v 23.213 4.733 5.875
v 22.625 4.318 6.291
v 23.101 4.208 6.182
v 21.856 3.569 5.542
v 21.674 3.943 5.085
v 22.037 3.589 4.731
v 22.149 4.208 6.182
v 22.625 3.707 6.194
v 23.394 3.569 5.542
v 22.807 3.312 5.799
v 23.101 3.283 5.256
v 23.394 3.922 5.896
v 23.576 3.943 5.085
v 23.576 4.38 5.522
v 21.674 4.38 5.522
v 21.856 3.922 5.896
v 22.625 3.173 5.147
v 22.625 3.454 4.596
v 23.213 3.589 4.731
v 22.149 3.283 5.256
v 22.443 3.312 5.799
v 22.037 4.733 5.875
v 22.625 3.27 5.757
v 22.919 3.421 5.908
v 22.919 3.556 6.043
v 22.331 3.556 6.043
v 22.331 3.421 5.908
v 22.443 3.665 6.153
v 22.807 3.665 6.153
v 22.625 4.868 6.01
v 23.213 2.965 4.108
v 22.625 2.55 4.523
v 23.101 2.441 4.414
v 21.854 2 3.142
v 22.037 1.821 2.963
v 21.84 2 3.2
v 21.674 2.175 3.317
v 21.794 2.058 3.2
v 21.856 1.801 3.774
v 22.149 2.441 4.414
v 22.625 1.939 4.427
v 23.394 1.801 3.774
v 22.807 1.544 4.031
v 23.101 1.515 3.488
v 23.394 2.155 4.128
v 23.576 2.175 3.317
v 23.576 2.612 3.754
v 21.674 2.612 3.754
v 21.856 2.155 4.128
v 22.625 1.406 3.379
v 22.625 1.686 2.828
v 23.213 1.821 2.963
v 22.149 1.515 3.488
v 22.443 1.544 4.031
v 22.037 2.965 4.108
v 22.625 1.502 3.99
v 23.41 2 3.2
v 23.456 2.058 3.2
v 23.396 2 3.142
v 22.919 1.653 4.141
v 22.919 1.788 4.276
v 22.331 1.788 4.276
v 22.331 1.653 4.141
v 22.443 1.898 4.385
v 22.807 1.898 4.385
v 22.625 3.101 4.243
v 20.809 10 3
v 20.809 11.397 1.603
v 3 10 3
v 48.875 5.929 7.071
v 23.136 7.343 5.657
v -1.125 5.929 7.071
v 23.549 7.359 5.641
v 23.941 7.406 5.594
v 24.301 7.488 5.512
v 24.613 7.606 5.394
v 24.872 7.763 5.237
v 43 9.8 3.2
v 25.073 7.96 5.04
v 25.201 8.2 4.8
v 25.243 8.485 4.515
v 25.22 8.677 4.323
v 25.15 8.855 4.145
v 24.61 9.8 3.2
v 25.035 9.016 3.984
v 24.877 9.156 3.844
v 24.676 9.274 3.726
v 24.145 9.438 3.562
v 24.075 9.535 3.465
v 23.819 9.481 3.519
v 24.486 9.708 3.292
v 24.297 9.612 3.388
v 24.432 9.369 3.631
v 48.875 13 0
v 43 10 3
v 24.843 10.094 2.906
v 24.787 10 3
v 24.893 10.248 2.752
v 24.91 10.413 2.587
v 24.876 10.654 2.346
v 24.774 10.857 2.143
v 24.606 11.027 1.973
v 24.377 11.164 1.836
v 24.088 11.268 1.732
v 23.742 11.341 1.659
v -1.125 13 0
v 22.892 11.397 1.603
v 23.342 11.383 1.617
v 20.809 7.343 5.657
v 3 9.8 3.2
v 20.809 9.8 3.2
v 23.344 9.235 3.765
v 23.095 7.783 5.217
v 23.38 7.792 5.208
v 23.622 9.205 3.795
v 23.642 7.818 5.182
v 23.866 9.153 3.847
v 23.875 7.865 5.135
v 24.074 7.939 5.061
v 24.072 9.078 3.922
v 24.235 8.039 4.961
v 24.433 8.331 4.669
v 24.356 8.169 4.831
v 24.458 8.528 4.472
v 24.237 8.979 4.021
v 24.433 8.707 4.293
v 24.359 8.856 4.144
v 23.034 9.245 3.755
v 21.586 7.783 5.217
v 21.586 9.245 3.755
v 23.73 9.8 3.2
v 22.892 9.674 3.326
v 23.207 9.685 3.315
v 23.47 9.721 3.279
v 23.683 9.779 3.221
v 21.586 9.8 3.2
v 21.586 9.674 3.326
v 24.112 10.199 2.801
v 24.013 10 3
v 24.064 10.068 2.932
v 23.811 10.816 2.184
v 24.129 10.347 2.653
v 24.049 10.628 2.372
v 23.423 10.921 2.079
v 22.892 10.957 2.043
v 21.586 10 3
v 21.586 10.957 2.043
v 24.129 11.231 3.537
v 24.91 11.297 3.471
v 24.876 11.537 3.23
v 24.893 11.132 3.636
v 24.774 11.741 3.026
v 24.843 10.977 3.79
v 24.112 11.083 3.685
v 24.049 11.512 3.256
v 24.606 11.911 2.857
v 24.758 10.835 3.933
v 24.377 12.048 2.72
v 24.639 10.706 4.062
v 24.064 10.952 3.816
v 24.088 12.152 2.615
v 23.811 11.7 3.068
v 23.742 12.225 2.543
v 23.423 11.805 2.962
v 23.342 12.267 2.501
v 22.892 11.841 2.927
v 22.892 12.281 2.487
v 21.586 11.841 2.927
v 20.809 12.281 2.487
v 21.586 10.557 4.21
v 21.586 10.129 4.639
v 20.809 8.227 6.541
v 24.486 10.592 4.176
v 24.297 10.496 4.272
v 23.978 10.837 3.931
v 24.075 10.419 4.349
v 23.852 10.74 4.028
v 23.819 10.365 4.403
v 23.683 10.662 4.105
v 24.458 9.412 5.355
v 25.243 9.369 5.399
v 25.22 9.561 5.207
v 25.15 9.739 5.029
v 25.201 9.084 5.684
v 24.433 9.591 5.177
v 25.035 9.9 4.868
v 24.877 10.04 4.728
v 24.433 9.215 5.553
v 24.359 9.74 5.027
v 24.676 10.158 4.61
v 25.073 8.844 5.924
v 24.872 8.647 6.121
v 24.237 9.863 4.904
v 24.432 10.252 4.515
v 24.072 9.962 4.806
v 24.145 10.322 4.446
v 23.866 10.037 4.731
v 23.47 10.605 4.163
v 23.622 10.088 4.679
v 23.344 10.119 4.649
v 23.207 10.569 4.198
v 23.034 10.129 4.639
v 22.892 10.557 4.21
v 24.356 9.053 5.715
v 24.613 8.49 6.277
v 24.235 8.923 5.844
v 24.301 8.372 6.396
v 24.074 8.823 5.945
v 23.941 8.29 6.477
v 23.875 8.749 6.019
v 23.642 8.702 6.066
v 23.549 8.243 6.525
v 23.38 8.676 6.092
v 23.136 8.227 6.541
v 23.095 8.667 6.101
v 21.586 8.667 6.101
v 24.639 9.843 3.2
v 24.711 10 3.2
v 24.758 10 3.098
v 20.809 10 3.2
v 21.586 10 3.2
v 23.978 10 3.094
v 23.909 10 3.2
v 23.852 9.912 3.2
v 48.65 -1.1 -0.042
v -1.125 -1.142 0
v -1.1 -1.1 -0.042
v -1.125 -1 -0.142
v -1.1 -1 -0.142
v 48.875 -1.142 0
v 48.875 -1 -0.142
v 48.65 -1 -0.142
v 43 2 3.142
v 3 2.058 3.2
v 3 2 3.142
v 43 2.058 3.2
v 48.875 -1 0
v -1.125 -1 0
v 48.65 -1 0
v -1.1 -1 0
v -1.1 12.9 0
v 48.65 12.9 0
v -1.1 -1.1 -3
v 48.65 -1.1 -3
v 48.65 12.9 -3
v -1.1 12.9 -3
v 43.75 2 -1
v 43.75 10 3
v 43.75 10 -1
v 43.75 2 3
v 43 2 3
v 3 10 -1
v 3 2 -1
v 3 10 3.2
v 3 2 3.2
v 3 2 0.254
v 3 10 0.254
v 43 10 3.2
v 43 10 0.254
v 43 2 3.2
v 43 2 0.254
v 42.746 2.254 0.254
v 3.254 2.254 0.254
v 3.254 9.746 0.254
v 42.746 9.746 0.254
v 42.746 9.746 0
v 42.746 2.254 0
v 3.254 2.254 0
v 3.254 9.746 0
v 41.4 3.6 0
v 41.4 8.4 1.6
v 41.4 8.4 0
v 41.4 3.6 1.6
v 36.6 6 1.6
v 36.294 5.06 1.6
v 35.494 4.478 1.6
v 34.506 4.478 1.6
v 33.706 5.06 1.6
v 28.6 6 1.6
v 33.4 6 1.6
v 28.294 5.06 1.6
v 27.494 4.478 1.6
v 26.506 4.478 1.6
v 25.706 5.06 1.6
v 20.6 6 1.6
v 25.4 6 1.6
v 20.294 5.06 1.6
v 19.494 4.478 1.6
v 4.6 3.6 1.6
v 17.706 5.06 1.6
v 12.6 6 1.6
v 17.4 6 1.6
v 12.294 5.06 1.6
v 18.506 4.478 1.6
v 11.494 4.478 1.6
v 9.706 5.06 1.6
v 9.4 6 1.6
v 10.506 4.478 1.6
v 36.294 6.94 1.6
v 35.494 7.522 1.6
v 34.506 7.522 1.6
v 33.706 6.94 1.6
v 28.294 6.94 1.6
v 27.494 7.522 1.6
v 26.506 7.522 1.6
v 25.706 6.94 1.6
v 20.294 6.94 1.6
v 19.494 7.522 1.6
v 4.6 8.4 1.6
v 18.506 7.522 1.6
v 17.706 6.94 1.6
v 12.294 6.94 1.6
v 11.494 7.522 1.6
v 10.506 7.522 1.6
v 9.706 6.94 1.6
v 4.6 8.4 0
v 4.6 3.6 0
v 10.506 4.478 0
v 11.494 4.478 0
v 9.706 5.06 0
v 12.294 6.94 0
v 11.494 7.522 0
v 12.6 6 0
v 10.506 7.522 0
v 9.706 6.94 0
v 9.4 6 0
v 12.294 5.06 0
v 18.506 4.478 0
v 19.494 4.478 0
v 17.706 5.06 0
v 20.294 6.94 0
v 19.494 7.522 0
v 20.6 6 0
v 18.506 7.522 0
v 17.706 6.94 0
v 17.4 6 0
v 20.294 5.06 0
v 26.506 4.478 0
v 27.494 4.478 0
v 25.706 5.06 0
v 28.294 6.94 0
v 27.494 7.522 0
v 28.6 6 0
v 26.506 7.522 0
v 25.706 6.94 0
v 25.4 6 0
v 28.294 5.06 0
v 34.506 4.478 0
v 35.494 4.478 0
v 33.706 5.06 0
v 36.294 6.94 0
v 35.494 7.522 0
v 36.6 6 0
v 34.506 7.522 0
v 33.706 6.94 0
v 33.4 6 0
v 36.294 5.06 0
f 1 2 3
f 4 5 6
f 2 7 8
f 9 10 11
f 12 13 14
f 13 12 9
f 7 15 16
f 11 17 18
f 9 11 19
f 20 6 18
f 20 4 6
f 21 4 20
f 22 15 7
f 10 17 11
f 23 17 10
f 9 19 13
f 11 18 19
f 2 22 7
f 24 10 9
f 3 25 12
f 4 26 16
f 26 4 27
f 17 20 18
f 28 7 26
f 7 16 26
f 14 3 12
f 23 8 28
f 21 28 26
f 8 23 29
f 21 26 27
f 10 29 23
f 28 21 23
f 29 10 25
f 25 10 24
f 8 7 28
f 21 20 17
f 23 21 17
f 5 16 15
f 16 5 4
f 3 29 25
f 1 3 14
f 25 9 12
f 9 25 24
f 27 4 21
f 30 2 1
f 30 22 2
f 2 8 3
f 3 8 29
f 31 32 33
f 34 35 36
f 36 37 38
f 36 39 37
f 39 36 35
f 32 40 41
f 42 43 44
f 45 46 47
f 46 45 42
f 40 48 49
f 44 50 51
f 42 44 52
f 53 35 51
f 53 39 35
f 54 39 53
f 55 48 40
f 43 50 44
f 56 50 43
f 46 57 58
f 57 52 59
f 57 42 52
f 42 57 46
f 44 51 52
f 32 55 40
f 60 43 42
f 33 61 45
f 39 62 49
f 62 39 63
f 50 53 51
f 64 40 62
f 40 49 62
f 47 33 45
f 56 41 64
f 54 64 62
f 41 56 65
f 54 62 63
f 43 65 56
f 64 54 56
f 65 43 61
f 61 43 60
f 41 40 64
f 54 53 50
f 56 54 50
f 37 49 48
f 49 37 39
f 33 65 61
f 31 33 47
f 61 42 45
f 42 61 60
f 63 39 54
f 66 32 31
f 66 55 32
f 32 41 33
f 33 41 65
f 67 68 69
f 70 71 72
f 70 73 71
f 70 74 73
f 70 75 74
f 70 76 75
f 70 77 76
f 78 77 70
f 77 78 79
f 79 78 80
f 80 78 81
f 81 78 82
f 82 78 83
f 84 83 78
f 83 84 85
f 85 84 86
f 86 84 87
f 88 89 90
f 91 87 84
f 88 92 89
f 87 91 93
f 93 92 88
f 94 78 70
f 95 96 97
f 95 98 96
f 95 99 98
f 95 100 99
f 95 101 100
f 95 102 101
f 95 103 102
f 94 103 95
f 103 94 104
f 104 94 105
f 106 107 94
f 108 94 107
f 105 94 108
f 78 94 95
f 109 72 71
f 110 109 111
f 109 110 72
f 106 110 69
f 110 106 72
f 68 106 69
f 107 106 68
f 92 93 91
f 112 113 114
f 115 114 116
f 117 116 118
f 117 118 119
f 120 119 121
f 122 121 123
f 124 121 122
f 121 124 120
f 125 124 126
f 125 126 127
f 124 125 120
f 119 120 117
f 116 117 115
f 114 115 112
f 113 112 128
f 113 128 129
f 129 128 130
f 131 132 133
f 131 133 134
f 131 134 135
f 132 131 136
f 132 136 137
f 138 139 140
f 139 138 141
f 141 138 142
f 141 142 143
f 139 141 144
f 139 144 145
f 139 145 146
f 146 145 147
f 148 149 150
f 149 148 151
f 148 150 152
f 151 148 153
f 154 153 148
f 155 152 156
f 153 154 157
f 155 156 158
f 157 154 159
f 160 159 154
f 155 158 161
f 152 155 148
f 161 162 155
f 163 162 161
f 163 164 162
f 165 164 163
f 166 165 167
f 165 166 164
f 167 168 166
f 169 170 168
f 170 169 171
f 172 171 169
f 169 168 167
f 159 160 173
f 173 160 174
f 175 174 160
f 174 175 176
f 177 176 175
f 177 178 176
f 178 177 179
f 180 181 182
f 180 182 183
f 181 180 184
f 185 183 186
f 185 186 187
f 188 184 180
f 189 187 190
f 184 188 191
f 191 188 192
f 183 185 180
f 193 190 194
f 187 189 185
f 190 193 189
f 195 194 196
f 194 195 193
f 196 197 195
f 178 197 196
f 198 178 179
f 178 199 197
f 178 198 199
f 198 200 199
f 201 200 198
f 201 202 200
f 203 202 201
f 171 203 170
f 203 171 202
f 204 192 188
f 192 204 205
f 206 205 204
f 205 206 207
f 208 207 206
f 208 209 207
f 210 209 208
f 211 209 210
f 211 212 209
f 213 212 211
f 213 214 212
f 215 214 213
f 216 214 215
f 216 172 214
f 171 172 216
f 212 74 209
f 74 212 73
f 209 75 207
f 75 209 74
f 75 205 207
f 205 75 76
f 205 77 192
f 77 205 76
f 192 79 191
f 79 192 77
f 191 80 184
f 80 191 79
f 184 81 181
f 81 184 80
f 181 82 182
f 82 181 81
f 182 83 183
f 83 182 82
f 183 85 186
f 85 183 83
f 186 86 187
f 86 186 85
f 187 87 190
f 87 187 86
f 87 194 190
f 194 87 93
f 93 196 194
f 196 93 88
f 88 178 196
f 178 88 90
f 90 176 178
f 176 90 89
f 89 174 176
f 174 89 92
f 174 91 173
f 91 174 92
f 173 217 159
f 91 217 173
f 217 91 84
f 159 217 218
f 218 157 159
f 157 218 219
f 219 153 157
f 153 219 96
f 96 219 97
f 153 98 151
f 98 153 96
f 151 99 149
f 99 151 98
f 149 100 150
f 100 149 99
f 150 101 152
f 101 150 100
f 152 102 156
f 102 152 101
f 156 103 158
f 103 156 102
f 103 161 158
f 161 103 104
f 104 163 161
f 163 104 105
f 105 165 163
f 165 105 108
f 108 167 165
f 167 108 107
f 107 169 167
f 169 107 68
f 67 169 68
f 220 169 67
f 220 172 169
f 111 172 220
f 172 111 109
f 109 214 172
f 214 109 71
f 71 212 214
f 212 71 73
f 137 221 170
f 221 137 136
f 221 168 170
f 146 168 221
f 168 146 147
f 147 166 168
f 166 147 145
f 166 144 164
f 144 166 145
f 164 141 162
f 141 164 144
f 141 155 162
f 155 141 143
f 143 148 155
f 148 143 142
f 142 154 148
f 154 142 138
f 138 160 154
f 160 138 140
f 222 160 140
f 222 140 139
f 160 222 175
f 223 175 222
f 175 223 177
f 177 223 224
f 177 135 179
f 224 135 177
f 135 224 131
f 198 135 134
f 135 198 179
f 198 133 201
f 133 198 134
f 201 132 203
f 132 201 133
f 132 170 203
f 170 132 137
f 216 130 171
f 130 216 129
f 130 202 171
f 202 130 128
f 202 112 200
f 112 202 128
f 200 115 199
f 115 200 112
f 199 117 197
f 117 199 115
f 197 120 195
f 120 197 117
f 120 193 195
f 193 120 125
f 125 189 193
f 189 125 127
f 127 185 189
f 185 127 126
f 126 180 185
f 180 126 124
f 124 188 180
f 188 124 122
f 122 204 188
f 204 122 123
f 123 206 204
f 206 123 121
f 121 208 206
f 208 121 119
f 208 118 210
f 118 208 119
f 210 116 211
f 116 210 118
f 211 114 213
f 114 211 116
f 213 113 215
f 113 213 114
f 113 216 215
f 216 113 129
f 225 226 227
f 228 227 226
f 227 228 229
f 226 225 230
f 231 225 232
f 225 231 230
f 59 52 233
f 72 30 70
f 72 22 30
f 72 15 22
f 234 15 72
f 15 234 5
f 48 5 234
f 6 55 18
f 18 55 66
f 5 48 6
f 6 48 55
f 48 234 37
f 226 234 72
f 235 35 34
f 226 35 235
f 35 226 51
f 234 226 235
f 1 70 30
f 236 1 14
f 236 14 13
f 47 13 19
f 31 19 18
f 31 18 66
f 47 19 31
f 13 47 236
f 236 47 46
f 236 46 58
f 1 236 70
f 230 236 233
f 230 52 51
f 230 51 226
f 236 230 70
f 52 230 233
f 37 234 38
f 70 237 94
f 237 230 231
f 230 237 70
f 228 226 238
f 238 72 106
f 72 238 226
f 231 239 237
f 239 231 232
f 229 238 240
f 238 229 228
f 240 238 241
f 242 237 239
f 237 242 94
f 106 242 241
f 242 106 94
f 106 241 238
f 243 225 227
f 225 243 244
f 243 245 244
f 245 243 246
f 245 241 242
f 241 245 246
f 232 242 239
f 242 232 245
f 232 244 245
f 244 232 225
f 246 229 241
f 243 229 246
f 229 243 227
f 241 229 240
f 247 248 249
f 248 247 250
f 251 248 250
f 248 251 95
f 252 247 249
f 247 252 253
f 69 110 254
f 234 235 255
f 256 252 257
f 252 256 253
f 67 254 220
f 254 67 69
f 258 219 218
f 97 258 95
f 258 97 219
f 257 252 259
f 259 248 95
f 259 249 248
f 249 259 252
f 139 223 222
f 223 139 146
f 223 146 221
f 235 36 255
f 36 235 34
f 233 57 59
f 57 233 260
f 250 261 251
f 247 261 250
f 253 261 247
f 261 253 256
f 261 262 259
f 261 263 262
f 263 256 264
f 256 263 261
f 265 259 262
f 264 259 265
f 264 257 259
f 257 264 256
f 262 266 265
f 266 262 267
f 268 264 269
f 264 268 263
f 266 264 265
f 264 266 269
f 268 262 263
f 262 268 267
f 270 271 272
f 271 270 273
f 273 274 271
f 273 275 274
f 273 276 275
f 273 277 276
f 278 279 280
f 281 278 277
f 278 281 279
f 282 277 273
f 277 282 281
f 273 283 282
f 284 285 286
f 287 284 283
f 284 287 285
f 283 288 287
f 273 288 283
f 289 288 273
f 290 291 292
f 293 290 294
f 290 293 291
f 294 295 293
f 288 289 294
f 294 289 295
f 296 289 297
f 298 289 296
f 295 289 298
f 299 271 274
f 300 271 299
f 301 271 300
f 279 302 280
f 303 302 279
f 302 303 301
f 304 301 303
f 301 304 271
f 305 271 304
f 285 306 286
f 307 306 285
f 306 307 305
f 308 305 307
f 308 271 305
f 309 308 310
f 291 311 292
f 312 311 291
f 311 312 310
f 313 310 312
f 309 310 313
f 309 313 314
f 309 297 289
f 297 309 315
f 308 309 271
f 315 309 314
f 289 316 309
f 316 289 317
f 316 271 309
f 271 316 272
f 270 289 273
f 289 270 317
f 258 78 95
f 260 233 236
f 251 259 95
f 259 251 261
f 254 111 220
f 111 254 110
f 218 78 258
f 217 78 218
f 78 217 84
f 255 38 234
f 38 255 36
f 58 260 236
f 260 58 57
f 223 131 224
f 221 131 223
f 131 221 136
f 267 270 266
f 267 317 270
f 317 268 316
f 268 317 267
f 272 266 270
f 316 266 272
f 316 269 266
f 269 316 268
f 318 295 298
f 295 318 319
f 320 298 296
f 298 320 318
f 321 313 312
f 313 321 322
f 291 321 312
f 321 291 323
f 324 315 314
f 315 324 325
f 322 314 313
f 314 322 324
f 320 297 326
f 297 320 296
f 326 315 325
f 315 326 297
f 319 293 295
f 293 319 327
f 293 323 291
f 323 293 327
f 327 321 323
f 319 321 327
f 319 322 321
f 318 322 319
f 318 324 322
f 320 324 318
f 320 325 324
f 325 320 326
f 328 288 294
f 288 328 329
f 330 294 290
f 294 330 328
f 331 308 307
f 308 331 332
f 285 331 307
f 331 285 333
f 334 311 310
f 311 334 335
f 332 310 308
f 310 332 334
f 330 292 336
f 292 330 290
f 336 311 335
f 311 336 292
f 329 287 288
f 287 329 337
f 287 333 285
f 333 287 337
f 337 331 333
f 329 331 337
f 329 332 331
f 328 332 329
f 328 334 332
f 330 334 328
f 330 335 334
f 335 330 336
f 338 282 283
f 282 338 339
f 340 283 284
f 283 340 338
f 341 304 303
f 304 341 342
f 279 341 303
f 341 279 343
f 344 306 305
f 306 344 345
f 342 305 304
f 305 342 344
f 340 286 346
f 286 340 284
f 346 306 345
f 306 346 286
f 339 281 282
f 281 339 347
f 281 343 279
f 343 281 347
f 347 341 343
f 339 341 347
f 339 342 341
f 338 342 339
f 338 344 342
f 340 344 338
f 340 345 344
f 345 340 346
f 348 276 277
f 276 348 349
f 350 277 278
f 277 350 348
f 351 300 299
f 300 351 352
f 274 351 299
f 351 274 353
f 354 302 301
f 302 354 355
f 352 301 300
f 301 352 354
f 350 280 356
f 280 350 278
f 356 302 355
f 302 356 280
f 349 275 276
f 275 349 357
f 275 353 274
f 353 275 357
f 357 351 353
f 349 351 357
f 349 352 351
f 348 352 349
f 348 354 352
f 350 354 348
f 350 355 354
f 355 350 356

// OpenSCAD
// file: ../OpenSCAD/brailleAndText.scad
/*
Braille Module
http://creativecommons.org/licenses/by/3.0/
*/


// mm sizes from http://dots.physics.orst.edu/gs_layout.html
radius = 0.25;
spacing = 2.5;
startOffset = 3.75;
distance = startOffset + spacing;

plate_height = 10;
plate_thickness = 10;   // was 2.

$fn = 10;



module letter(bitmap, char) {
//    echo(char);
	row_size = 2;
	col_size = 3;
	bitmap_size = row_size * col_size;
	
	function loc_x(loc) = floor(loc / row_size) * spacing + spacing;
	function loc_y(loc) = loc % row_size * spacing  + (distance-spacing)/2;

    translate([0, loc_y(-1), -2]) {
        rotate([270, 0, 90]) {
            linear_extrude(height = 1.25)
            text(char, 6);
        }
    }
	
    for (loc = [0:bitmap_size - 1]) {
		if (bitmap[loc] != 0) {
			union() {
				translate(v = [loc_x(loc), loc_y(loc), 0]) {
					sphere(radius = radius* bitmap[loc], center = true);
				}
			}
		}
	}
}


module braille_char(char) {
	if (char == "A" || char == "a") {
		letter([
			1,0,
			0,0,
			0,0
		], char);
	} else if (char == "B" || char == "b") {
		letter([
			1,0,
			1,0,
			0,0
		], char);
	} else if (char == "C" || char == "c") {
		letter([
			1,1,
			0,0,
			0,0
		], char);
	} else if (char == "D" || char == "d") {
		letter([
			1,1,
			0,1,
			0,0
		], char);
	} else if (char == "E" || char == "e") {
		letter([
			1,0,
			0,1,
			0,0
		], char);
	} else if (char == "F" || char == "f") {
		letter([
			1,1,
			1,0,
			0,0
		], char);
	} else if (char == "G" || char == "g") {
		letter([
			1,1,
			1,1,
			0,0
		], char);
	} else if (char == "H" || char == "h") {
		letter([
			1,0,
			1,1,
			0,0
		], char);
	} else if (char == "I" || char == "i") {
		letter([
			0,1,
			1,0,
			0,0
		], char);
	} else if (char == "J" || char == "j") {
		letter([
			0,1,
			1,1,
			0,0
		], char);
	} else if (char == "K" || char == "k") {
		letter([
			1,0,
			0,0,
			1,0
		], char);
	} else if (char == "L" || char == "l") {
		letter([
			1,0,
			1,0,
			1,0
		], char);
	} else if (char == "M" || char == "m") {
		letter([
			1,1,
			0,0,
			1,0
		], char);
	} else if (char == "N" || char == "n") {
		letter([
			1,1,
			0,1,
			1,0
		], char);
	} else if (char == "O" || char == "o") {
		letter([
			1,0,
			0,1,
			1,0
		], char);
	} else if (char == "P" || char == "p") {
		letter([
			1,1,
			1,0,
			1,0
		], char);
	} else if (char == "Q" || char == "q") {
		letter([
			1,1,
			1,1,
			1,0
		], char);
	} else if (char == "R" || char == "r") {
		letter([
			1,0,
			1,1,
			1,0
		], char);
	} else if (char == "S" || char == "s") {
		letter([
			0,1,
			1,0,
			1,0
		], char);
	} else if (char == "T" || char == "t") {
		letter([
			0,1,
			1,1,
			1,0
		], char);
	} else if (char == "U" || char == "u") {
		letter([
			1,0,
			0,0,
			1,1
		], char);
	} else if (char == "V" || char == "v") {
		letter([
			1,0,
			1,1,
			1,0
		], char);
	} else if (char == "W" || char == "w") {
		letter([
			0,1,
			1,1,
			0,1
		], char);
	} else if (char == "X" || char == "x") {
		letter([
			1,1,
			0,0,
			1,1
		], char);
	} else if (char == "Y" || char == "y") {
		letter([
			1,1,
			0,1,
			1,1
		], char);
	} else if (char == "Z" || char == "z") {
		letter([
			1,0,
			0,1,
			1,1
		], char);
    } else if (char == " ") {
		letter([
			0,0,
			0,0,
			0,0
		], char);
	} else {
		echo("Invalid Character: ", char);
	}

}

module braille_str(chars) {
    char_count = len(chars);
	echo(str("Total Width of ", chars, " : ",  distance * char_count, "mm"));
	union() {
		for (count = [0:char_count-1]) {
			translate(v = [0, count * distance, plate_thickness]) {
				braille_char(chars[count]);
			}
		}
		translate(v = [0, -distance/2, 0]) {
			color([0,0,1]) {
				cube(size = [plate_height, distance * (char_count+1), plate_thickness]);
			}
            }                                                      
	}
}

function lenText(txt="Hi") = distance * len(txt);

module printTextAndBraille(textToPrint) {
    blockLen = lenText(textToPrint);
    union()
    {
        difference() {                      // remove second box from first
            rotate([0,45,0]) {              // make it on its edge
                braille_str((textToPrint)); // make a long box
            }
            translate([0, -3.25, -8]) {     // move in right place
                cube(size = [14, (blockLen+8), 8]);
            }
        } 
        translate([0.1, -3.1, -3]) {     // move in right place
            cube(size = [14, (blockLen+6), 3]); 
        }
    }                                 
}

printTextAndBraille("HELLO CalLUM");
// file: ../openSCADLibs/lego_brick_builder.scad
/*

 Basic Lego brick builder module for OpenScad by Jorg Janssen 2013 (CC BY-NC 3.0) 
 To use this in your own projects add:

 use <path_to_this_file/lego_brick_builder.scad>
 brick (length, width, height [,smooth]);

 Length and width are in standard lego brick dimensions. 
 Height is in flat brick heights, so for a normal lego brick height = 3.
 Add optional smooth = true for a brick without studs. 
 Use height = 0 to just put studs/knobs on top of other things.

 */
$fn = 150;

// and this is how it's done:

FLU = 1.6; // Fundamental Lego Unit = 1.6 mm

BRICK_WIDTH = 5*FLU; // basic brick width
BRICK_HEIGHT = 6*FLU; // basic brick height
PLATE_HEIGHT = 2*FLU; // basic plate height
WALL_THICKNESS = FLU; // outer wall of the brick
STUD_RADIUS = 1.5*FLU; // studs are the small cylinders on top of the brick with the lego logo ('nopje' in Dutch)
STUD_HEIGHT = FLU; 
ANTI_STUD_RADIUS = 0.5*4.07*FLU;  // an anti stud is the hollow cylinder inside bricks that have length > 1 and width > 1
PIN_RADIUS = FLU; // a pin is the small cylinder inside bricks that have length = 1 or width = 1
SUPPORT_THICKNESS = 0.254; // support is the thin surface between anti studs, pins and walls, your printer might not print this thin, try thicker!
EDGE = 0.254; // this is the width and height of the bottom line edge of smooth bricks
CORRECTION = 0.1; // addition to each size, to make sure all parts connect by moving them a little inside each other

module brick(length = 4, width = 2, height = 3, smooth = false){

	// brick shell
	difference(){
		cube(size = [length*BRICK_WIDTH,width*BRICK_WIDTH,height*PLATE_HEIGHT]);
		translate([WALL_THICKNESS,WALL_THICKNESS,-WALL_THICKNESS])
		union(){
			cube(size = [length*BRICK_WIDTH-2*WALL_THICKNESS,width*BRICK_WIDTH-2*WALL_THICKNESS,height*PLATE_HEIGHT]);
			// stud inner holes, radius = pin radius
			if (!smooth) {
				translate([STUD_RADIUS+WALL_THICKNESS,STUD_RADIUS+WALL_THICKNESS,height*PLATE_HEIGHT])
				for (y = [0:width-1]){
					for (x = [0:length-1]){
						translate ([x*BRICK_WIDTH-WALL_THICKNESS,y*BRICK_WIDTH-WALL_THICKNESS,-CORRECTION])
						cylinder(h=WALL_THICKNESS+2*CORRECTION,r=PIN_RADIUS);
					}
				}
			}
			// small bottom line edge for smooth bricks
			else {
				translate([-WALL_THICKNESS-CORRECTION,-WALL_THICKNESS-CORRECTION,FLU-CORRECTION]) 
				difference() {
					cube([length*BRICK_WIDTH+2*CORRECTION,width*BRICK_WIDTH+2*CORRECTION,EDGE+CORRECTION]);
					translate([EDGE+CORRECTION,EDGE+CORRECTION,-CORRECTION])
					cube([length*BRICK_WIDTH-2*EDGE,width*BRICK_WIDTH-2*EDGE,EDGE+3*CORRECTION]); 
				}
			}
		}
	}
	// Studs
	if(!smooth){
		translate([STUD_RADIUS+WALL_THICKNESS,STUD_RADIUS+WALL_THICKNESS,height*PLATE_HEIGHT])
		for (y = [0:width-1]){
			for (x = [0:length-1]){
				translate ([x*BRICK_WIDTH,y*BRICK_WIDTH,-CORRECTION])
				difference(){
					cylinder(h=STUD_HEIGHT+CORRECTION, r=STUD_RADIUS);
					// Stud inner holes
					translate([0,0,-CORRECTION])
					cylinder(h=0.5*STUD_HEIGHT+CORRECTION,r=PIN_RADIUS);
				}
				// tech logo - disable this if your printer isn't capable of printing this small
				if ( length > width){
					translate([x*BRICK_WIDTH+0.8,y*BRICK_WIDTH-1.9,STUD_HEIGHT-CORRECTION])
					resize([1.2*1.7,2.2*1.7,0.254+CORRECTION])
					rotate(a=[0,0,90])
					import("tech.stl");
				}
				else {
					translate([x*BRICK_WIDTH-1.9,y*BRICK_WIDTH-0.8,STUD_HEIGHT-CORRECTION])
					resize([2.2*1.7,1.2*1.7,0.254+CORRECTION])
					import("tech.stl");				
				}				
				/* 
				// Alternative 2-square logo
				translate ([x*BRICK_WIDTH+CORRECTION,y*BRICK_WIDTH-CORRECTION,STUD_HEIGHT-CORRECTION])		
				cube([1,1,2*CORRECTION]);
				translate ([x*BRICK_WIDTH-0.9,y*BRICK_WIDTH-0.9,STUD_HEIGHT-CORRECTION])		
				cube([1,1,0.3]);
				*/				
			}
		}
	}
	// Pins x
	if (width == 1 && length > 1) {	
			for (x = [1:length-1]){
				translate([x*BRICK_WIDTH,0.5*BRICK_WIDTH,0])
				cylinder(h=height*PLATE_HEIGHT-WALL_THICKNESS+CORRECTION,r=PIN_RADIUS);
				// Supports
				if (height > 1) {
				translate([x*BRICK_WIDTH-0.5*SUPPORT_THICKNESS,CORRECTION,STUD_HEIGHT])
				cube(size=[SUPPORT_THICKNESS,BRICK_WIDTH-2*CORRECTION,height*PLATE_HEIGHT-STUD_HEIGHT-WALL_THICKNESS+CORRECTION]);
			}
		}
	}
	// Pins y
	if (length == 1 && width > 1) {	
			for (y = [1:width-1]){
			translate([0.5*BRICK_WIDTH,y*BRICK_WIDTH,0])
			cylinder(h=height*PLATE_HEIGHT-WALL_THICKNESS+CORRECTION,r=PIN_RADIUS);
			// Supports
			if (height > 1) {
			translate([CORRECTION,y*BRICK_WIDTH-0.5*SUPPORT_THICKNESS,STUD_HEIGHT])
			cube(size=[BRICK_WIDTH-2*CORRECTION,SUPPORT_THICKNESS,height*PLATE_HEIGHT-STUD_HEIGHT-WALL_THICKNESS+CORRECTION]);}
			
		}
	}
	// Anti Studs
	if (width > 1 && length > 1){
		difference(){
			union(){
				for(y = [1:width-1]){
					for(x = [1:length-1]){
						// anti studs
						translate([x*BRICK_WIDTH,y*BRICK_WIDTH,0])
						cylinder (h=height*PLATE_HEIGHT-WALL_THICKNESS+CORRECTION, r = ANTI_STUD_RADIUS);
						// Supports
						if (height > 1){
							// Support x
							if (x%2 == 0 && (length%2 == 0 || length%4 == 1 && x<length/2 || length%4 == 3 && x>length/2) || x%2 == 1 && (length%4 == 3 && x<length/2 || length%4 == 1 && x>length/2)) {
								translate([BRICK_WIDTH*x-0.5*SUPPORT_THICKNESS,y*BRICK_WIDTH-BRICK_WIDTH+WALL_THICKNESS-CORRECTION,STUD_HEIGHT])
								cube(size=[SUPPORT_THICKNESS,2*BRICK_WIDTH-2*WALL_THICKNESS,height*PLATE_HEIGHT-STUD_HEIGHT-WALL_THICKNESS+CORRECTION]);
							}
							// Supports y							
							if (y%2 == 0 && (width%2 == 0 || width%4 == 1 && y<width/2 || width%4 == 3 && y>width/2) || y%2 == 1 && (width%4 == 3 && y<width/2 || width%4 == 1 && y>width/2)) {
								translate([x*BRICK_WIDTH-BRICK_WIDTH+WALL_THICKNESS-CORRECTION,BRICK_WIDTH*y-0.5*SUPPORT_THICKNESS,STUD_HEIGHT])
								cube(size=[2*BRICK_WIDTH-2*WALL_THICKNESS,SUPPORT_THICKNESS,height*PLATE_HEIGHT-STUD_HEIGHT-WALL_THICKNESS+CORRECTION]);
							}
						}
					}
				}
			}
			union(){
				for(y = [1:width-1]){
					for(x = [1:length-1]){
						// hollow anti studs
						translate([x*BRICK_WIDTH,y*BRICK_WIDTH,-WALL_THICKNESS])
						cylinder (h=height*PLATE_HEIGHT, r = STUD_RADIUS);				
					}
				}
			}
		}		
	}
}
	
// file: ../OpenSCAD/TextAndBrailleLegoBlock.scad
 include <../openSCADLibs/lego_brick_builder.scad>
 include <../OpenSCAD/brailleAndText.scad>;

module brickAndText(text) {
    txtLen = distance * len(text);
    echo(distance);
    difference() {
        rotate([180,180,90])
            translate([-13, 2, 0])
                printTextAndBraille(text);
        translate([3, 2, -1]) 
            cube([txtLen - 3, BRICK_WIDTH, 4]);
    }
    translate([3,2,0])
        brick(floor(txtLen / BRICK_WIDTH),1,1, true);    
}

// use <../BPNodesV2/TextNBraille.scad>
//brickAndText("This is a test string");  
// main file
use <../OpenSCAD/TextAndBrailleLegoBlock.scad>

brickAndText("   B   ");
